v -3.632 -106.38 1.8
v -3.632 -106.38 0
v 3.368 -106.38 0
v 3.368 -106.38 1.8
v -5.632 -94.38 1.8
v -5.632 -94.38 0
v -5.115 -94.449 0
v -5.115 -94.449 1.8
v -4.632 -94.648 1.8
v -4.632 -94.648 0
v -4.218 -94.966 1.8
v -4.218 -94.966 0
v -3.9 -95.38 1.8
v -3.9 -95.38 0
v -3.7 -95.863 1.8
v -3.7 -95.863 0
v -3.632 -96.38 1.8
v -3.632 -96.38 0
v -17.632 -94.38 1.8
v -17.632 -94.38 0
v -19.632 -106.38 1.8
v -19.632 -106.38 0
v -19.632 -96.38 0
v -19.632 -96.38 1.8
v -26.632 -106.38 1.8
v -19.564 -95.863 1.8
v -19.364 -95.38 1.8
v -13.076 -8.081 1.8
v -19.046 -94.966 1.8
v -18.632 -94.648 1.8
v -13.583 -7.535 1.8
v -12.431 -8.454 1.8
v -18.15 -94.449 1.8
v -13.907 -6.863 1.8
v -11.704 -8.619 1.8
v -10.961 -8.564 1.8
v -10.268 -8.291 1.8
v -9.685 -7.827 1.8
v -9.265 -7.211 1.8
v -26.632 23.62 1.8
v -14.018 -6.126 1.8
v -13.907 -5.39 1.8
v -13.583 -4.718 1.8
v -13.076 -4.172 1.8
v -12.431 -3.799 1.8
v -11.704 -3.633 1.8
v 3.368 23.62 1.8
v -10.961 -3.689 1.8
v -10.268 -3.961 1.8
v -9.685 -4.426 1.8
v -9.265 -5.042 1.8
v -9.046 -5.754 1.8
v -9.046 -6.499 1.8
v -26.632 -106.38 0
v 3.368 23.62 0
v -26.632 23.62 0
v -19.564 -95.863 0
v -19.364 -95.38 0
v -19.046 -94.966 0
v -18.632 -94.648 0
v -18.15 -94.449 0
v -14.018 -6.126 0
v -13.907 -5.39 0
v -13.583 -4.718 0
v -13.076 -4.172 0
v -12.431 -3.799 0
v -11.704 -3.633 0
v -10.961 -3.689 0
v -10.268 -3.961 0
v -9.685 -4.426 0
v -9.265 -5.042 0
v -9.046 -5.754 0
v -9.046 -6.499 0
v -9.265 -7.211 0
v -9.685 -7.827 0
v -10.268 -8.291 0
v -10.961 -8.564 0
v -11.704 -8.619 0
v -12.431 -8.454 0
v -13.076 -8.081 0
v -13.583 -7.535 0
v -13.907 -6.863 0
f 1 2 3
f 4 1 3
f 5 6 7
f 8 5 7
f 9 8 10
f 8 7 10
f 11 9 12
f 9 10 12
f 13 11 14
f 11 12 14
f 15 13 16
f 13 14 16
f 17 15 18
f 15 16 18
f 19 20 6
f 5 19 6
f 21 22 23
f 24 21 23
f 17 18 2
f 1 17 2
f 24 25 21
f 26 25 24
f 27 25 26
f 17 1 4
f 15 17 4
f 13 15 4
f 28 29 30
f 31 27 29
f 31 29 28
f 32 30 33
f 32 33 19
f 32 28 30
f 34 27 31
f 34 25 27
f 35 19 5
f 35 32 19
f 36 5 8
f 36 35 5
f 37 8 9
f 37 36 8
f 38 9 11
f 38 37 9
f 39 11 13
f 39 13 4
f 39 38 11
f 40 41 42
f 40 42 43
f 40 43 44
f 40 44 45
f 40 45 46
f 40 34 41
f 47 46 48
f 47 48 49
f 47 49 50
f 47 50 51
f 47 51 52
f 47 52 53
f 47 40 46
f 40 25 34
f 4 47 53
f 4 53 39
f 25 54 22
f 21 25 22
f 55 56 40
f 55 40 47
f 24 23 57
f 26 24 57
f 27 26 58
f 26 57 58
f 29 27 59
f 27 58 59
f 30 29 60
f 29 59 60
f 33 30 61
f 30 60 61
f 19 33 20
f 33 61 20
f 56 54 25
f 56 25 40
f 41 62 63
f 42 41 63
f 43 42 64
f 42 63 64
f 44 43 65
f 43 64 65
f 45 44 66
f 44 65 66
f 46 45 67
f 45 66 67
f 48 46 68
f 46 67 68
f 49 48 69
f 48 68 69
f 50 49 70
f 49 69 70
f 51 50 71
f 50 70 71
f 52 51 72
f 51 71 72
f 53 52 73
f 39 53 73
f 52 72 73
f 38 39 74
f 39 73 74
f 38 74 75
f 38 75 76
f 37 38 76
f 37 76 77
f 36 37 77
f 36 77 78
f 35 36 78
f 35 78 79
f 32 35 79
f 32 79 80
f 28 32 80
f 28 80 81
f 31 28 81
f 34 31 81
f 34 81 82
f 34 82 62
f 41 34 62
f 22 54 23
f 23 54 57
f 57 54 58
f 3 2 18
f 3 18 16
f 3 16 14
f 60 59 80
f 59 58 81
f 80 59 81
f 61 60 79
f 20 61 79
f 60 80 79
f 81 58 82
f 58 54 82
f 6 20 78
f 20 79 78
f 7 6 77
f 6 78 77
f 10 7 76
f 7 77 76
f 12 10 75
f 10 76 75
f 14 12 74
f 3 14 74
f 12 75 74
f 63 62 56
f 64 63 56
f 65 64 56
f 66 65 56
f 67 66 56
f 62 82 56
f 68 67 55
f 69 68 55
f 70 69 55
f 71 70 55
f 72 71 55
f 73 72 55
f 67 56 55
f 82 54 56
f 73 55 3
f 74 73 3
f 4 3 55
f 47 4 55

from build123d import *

# Parameters (mm, degrees)
ESBO_O1_W                = 30
ESBO_O1_H                = 130
RESSALTO_EXTRUS_O1_DEPTH = 1.8
ESBO_O2_R                = 2.5
CORTE_EXTRUS_O1_DEPTH    = 10
CORTE_EXTRUS_O2_DEPTH    = 10.2


with BuildPart() as part:
    # Esboço1 → Ressalto-extrusão1 (new body)
    with BuildSketch(Plane.XY):
        with Locations((-11.632173448, -41.380470016)):
            Rectangle(ESBO_O1_W, ESBO_O1_H)
    extrude(amount=RESSALTO_EXTRUS_O1_DEPTH)

    # Esboço2 → Corte-extrusão1 (cut)
    with BuildSketch(Plane(origin=(0, 0, 0), x_dir=(-1, 0, 0), z_dir=(0, 0, -1))):
        with Locations((11.517661918, -6.126398996)):
            Circle(ESBO_O2_R)
    extrude(amount=-CORTE_EXTRUS_O1_DEPTH, mode=Mode.SUBTRACT)

    # Esboço3 → Corte-extrusão2 (cut)
    with BuildSketch(Plane(origin=(0, 0, 0), x_dir=(-1, 0, 0), z_dir=(0, 0, -1))):
        with BuildLine():
            Line((3.632173448, -106.380470016), (19.632173448, -106.380470016))
            Line((19.632173448, -106.380470016), (19.632173448, -96.380470016))
            ThreePointArc((19.632173448, -96.380470016), (19.04638701, -94.966256454), (17.632173448, -94.380470016))
            Line((17.632173448, -94.380470016), (5.632173448, -94.380470016))
            ThreePointArc((5.632173448, -94.380470016), (4.217959885, -94.966256454), (3.632173448, -96.380470016))
            Line((3.632173448, -96.380470016), (3.632173448, -106.380470016))
        make_face()
    extrude(amount=-CORTE_EXTRUS_O2_DEPTH, mode=Mode.SUBTRACT)


solid = part.part
